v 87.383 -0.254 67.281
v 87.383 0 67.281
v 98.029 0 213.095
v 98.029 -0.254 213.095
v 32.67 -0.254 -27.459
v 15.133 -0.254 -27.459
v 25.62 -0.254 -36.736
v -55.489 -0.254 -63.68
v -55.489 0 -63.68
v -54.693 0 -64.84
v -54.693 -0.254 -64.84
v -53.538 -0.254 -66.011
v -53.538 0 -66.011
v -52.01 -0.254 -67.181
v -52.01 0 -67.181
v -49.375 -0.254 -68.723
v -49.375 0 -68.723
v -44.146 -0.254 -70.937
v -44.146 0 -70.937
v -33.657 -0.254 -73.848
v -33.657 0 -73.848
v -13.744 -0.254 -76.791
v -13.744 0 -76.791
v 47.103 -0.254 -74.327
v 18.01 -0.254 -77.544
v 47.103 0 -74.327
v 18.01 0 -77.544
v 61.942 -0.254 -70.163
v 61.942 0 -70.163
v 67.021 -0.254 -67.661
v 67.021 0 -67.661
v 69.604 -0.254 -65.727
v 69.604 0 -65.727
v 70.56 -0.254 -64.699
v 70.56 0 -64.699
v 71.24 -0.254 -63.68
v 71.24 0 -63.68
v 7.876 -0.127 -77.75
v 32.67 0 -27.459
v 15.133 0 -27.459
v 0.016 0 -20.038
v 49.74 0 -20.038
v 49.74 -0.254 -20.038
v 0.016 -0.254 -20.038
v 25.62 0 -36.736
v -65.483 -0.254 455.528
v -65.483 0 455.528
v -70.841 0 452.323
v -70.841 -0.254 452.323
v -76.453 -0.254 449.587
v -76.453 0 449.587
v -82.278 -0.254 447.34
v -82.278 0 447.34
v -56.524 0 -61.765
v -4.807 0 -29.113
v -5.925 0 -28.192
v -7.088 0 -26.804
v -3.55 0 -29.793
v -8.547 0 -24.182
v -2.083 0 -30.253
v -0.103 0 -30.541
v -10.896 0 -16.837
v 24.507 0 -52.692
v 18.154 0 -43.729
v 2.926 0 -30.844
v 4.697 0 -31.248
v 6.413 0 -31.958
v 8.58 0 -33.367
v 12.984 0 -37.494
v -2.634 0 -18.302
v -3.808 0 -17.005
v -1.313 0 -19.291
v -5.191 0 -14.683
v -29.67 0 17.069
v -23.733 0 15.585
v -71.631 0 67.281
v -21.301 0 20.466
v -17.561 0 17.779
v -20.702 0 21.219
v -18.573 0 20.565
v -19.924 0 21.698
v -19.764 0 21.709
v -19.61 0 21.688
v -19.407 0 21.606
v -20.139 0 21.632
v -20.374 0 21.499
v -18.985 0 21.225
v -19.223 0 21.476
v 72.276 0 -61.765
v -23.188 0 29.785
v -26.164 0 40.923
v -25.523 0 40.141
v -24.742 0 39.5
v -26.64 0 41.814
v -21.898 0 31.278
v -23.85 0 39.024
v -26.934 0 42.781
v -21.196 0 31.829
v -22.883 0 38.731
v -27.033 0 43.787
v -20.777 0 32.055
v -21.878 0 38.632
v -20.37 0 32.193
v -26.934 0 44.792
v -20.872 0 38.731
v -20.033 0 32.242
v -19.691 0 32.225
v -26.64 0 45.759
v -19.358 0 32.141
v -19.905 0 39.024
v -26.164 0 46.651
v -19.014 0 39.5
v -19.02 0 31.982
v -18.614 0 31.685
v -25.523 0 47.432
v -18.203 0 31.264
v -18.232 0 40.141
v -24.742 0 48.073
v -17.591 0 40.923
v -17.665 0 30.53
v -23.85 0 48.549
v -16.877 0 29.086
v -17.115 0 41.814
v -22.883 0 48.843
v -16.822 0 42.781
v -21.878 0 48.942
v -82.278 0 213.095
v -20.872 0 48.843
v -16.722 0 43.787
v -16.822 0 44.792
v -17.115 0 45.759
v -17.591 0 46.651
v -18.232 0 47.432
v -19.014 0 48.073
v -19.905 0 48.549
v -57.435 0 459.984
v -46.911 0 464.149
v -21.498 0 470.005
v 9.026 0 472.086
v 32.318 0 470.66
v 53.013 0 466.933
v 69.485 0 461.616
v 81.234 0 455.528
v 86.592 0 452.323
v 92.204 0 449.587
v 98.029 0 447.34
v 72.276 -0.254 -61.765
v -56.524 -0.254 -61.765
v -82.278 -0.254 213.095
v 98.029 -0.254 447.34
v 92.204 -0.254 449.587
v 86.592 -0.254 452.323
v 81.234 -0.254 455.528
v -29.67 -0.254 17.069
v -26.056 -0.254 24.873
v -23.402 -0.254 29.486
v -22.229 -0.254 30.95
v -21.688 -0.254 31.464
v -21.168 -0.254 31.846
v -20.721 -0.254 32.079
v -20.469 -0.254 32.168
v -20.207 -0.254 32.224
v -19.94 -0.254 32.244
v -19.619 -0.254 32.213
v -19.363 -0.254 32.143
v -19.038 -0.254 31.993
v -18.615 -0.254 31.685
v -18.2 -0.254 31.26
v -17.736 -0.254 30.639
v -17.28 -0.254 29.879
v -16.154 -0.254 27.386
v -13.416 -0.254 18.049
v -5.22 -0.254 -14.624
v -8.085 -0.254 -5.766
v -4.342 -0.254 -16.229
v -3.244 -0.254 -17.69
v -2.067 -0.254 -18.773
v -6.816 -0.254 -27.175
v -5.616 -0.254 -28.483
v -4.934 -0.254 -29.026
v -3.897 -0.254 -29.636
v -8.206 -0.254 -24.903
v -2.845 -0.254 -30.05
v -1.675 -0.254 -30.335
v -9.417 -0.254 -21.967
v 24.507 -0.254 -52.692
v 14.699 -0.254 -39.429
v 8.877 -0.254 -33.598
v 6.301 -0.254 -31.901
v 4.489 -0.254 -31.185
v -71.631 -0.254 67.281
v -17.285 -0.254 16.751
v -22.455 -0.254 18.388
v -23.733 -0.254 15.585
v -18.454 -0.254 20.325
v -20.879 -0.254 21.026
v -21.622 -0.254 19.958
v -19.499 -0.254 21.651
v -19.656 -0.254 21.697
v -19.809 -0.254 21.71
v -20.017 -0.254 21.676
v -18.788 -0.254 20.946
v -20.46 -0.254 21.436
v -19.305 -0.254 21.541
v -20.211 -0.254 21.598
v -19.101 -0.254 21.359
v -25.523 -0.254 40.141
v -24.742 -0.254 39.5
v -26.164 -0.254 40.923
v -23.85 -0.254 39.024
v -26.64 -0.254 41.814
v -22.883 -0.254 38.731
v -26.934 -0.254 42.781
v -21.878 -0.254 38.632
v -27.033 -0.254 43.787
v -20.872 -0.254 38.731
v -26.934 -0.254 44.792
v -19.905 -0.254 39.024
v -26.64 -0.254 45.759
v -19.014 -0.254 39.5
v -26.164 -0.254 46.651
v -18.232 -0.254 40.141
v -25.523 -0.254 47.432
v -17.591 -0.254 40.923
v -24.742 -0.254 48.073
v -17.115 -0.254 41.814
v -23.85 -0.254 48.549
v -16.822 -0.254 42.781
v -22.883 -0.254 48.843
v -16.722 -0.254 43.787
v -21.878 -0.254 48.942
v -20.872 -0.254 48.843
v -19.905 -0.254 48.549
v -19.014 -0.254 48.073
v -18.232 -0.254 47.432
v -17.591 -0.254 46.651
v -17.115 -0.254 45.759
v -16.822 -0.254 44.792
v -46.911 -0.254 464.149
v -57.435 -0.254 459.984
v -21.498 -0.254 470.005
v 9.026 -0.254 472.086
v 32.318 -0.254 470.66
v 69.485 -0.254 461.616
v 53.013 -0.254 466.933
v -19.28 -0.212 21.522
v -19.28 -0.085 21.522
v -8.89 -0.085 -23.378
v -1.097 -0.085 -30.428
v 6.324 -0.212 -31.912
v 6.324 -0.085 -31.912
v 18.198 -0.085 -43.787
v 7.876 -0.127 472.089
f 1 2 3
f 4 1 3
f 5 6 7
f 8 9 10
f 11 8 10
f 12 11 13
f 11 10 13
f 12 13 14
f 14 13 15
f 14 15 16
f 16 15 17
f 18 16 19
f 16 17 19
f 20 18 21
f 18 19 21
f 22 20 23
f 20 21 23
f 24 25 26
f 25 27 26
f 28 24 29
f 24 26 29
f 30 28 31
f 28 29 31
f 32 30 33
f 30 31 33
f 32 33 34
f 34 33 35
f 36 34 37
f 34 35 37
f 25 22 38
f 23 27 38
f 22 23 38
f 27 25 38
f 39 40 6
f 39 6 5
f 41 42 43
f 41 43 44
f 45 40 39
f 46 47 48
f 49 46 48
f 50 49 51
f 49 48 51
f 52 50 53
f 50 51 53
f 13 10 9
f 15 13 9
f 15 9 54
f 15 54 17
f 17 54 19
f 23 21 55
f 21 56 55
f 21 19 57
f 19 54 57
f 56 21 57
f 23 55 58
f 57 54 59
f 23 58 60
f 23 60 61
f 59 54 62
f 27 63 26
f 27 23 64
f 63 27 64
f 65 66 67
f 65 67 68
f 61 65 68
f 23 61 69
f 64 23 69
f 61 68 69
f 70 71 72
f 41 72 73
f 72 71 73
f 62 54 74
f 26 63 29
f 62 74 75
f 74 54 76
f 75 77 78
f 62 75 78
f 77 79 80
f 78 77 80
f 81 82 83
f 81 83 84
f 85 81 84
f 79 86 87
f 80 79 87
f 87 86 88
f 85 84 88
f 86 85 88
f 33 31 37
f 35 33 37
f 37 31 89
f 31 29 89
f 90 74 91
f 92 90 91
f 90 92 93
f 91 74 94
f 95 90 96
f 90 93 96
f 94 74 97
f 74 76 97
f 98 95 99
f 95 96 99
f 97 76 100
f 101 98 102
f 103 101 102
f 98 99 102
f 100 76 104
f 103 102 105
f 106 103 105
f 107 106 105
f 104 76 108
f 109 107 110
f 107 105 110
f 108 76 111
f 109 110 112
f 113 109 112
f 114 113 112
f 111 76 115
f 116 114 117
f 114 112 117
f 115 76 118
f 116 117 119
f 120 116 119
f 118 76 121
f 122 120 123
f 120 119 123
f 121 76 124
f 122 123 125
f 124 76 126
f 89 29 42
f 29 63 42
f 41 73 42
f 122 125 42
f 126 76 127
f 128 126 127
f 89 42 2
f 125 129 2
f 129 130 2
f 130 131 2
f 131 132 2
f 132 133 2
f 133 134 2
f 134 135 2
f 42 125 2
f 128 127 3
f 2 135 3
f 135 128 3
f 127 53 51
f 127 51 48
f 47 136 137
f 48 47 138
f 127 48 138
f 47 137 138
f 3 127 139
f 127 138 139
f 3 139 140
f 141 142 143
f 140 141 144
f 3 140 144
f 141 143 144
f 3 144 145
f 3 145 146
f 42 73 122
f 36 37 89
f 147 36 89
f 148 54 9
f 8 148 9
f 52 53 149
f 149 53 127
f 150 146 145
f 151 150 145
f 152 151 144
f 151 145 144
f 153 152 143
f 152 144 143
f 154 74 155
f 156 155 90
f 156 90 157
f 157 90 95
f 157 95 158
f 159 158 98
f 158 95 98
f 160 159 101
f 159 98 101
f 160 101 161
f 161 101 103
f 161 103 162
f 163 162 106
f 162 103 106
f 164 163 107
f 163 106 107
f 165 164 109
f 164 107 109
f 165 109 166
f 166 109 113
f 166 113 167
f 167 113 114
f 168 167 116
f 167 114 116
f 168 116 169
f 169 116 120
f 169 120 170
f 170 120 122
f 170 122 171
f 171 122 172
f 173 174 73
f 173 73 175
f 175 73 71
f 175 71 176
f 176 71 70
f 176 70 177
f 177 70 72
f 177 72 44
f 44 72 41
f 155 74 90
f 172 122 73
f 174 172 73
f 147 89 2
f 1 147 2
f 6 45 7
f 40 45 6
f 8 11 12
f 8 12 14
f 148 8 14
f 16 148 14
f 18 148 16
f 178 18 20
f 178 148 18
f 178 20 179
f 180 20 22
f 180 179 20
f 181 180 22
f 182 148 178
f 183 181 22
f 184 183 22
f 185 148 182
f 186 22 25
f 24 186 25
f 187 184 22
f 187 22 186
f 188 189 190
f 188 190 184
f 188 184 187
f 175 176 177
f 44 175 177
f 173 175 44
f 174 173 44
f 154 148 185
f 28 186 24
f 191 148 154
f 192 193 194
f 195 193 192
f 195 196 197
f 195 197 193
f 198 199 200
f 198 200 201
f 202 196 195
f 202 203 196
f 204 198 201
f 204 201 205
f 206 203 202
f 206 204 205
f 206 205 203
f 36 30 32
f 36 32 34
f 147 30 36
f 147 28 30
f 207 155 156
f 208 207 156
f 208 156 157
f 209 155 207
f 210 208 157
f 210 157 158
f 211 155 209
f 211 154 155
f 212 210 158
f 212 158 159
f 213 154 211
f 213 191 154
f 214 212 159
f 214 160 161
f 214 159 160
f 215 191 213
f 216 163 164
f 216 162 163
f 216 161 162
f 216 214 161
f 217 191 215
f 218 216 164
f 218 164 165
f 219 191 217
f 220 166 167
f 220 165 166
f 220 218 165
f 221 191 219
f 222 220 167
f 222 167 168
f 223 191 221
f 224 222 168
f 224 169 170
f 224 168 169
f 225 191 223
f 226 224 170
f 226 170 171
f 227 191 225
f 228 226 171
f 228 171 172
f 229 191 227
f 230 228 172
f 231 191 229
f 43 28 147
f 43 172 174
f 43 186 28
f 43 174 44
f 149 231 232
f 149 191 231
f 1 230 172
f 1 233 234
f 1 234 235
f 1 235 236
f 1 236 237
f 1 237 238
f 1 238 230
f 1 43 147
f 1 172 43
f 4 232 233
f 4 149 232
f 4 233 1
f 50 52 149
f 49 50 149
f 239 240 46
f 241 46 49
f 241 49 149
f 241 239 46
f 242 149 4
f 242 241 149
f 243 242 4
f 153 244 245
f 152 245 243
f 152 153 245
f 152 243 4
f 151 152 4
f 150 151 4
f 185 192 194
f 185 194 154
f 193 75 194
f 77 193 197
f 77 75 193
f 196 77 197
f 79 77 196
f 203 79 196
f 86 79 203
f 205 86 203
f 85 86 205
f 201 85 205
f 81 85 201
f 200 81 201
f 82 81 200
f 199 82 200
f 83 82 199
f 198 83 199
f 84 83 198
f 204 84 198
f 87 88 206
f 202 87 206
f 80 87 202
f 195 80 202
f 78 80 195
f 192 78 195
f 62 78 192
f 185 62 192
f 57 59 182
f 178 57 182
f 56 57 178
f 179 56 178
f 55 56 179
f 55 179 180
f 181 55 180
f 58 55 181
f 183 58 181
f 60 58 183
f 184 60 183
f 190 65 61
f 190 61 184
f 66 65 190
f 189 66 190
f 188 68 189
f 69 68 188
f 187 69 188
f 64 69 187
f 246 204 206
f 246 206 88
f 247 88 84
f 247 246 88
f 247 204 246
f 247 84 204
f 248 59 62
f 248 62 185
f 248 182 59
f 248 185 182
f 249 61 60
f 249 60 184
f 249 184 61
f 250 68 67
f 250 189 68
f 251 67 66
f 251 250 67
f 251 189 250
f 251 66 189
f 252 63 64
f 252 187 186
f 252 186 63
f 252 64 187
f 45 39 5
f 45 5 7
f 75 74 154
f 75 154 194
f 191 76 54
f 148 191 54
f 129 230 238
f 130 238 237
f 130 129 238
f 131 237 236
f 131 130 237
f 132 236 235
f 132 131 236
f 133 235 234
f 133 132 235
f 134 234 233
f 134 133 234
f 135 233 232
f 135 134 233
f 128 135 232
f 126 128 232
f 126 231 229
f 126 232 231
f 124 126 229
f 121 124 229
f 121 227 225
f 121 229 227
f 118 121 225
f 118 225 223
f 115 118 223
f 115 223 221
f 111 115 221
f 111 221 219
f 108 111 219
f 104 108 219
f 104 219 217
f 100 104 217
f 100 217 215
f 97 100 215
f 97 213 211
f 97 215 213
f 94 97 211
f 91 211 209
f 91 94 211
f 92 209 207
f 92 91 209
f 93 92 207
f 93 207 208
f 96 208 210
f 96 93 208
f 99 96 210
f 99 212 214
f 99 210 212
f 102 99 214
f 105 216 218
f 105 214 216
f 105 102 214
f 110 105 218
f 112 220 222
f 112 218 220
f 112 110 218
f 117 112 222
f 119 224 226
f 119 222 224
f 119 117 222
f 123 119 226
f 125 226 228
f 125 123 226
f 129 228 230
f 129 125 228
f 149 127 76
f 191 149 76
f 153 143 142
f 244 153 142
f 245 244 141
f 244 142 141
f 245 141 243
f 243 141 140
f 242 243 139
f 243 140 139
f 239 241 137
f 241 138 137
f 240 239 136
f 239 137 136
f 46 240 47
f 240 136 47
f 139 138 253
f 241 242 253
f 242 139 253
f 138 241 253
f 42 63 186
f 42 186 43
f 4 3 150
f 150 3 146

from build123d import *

# Parameters (mm, degrees)
F2_DEPTH = 0.254
F0_R     = 5.1551211406
F3_DEPTH = 40.64


with BuildPart() as f2:
    # F1 (on Front) → F2 (new body)
    with BuildSketch(Plane.XZ):
        with BuildLine():
            Line((98.0293931603, 213.0949995701), (98.0293931603, 447.3398064059))
            ThreePointArc((98.0293931603, 447.3398064059), (89.3689862644, 450.894847932), (81.2344287075, 455.5284147234))
            add(Edge.make_bspline(
                [(81.2344287075, 455.5284147234), (7.8758224845, 503.7908629215), (-65.4827837385, 455.5284147234)],
                knots=[3.6912234215, 3.6912234215, 3.6912234215, 5.7335545392, 5.7335545392, 5.7335545392], degree=2, weights=[1, 0.5223724139, 1]))
            ThreePointArc((-65.4827837385, 455.5284147234), (-73.6173412954, 450.894847932), (-82.2777481914, 447.3398064059))
            Line((-82.2777481914, 447.3398064059), (-82.2777481914, 213.0949995701))
            Line((-82.2777481914, 213.0949995701), (-71.6314016223, 67.2814034059))
            Line((-71.6314016223, 67.2814034059), (-56.52420414, -61.7646081937))
            Line((-56.52420414, -61.7646081937), (-55.4887981594, -63.6801111653))
            add(Edge.make_bspline(
                [(-55.4887981594, -63.6801111653), (-47.8833589118, -77.7501877857), (7.8758224845, -77.7501877857), (63.6350038808, -77.7501877857), (71.2404431284, -63.6801111653)],
                knots=[3.2784171397, 3.2784171397, 3.2784171397, 4.7123889804, 4.7123889804, 6.1463608211, 6.1463608211, 6.1463608211], degree=2, weights=[1, 0.7537897491, 1, 0.7537897491, 1]))
            Line((71.2404431284, -63.6801111653), (72.2758491089, -61.7646081937))
            Line((72.2758491089, -61.7646081937), (87.3830465913, 67.2814034059))
            Line((87.3830465913, 67.2814034059), (98.0293931603, 213.0949995701))
        make_face()
    extrude(amount=F2_DEPTH)

    # F0 (on Front) → F3 (cut)
    with BuildSketch(Plane.XZ):
        with BuildLine():
            Line((-29.6701211482, 17.069382593), (-23.7329415977, 15.5850881711))
            add(Edge.make_bspline(
                [(-23.7329415977, 15.5850881711), (-22.1898984928, 19.0750479001), (-16.8016514541, 31.2618527374), (-12.4587472594, -26.5038893007), (-1.5388254929, -31.0067477607), (7.2099612907, -30.2367893705), (18.6011505638, -43.9117744096), (22.6841914598, -49.982726605), (24.5066136122, -52.6924319565)],
                knots=[0, 0, 0, 0, 0.1189249297, 0.4152812701, 0.5567959501, 0.6768926813, 0.8557844631, 1, 1, 1, 1], degree=3))
            Line((24.5066136122, -52.6924319565), (49.7396066785, -20.037965849))
            Line((49.7396066785, -20.037965849), (0.0157635659, -20.037965849))
            add(Edge.make_bspline(
                [(-29.6701211482, 17.069382593), (-25.888411588, 25.5551709484), (-16.0684249955, 47.59026554), (-8.5800350355, -15.4728792493), (-2.0058823339, -18.9643031175), (0.0157635659, -20.037965849)],
                knots=[0, 0, 0, 0, 0.3025023252, 0.7855094978, 1, 1, 1, 1], degree=3))
        make_face()
        Polygon((15.1328258216, -27.4594351649), (32.6702259481, -27.4594351649), (25.6198346615, -36.7362722754), align=None, mode=Mode.SUBTRACT)
        with Locations((-21.8775775284, 43.7866747379)):
            Circle(F0_R)
    extrude(amount=F3_DEPTH, mode=Mode.SUBTRACT)


solid = f2.part
